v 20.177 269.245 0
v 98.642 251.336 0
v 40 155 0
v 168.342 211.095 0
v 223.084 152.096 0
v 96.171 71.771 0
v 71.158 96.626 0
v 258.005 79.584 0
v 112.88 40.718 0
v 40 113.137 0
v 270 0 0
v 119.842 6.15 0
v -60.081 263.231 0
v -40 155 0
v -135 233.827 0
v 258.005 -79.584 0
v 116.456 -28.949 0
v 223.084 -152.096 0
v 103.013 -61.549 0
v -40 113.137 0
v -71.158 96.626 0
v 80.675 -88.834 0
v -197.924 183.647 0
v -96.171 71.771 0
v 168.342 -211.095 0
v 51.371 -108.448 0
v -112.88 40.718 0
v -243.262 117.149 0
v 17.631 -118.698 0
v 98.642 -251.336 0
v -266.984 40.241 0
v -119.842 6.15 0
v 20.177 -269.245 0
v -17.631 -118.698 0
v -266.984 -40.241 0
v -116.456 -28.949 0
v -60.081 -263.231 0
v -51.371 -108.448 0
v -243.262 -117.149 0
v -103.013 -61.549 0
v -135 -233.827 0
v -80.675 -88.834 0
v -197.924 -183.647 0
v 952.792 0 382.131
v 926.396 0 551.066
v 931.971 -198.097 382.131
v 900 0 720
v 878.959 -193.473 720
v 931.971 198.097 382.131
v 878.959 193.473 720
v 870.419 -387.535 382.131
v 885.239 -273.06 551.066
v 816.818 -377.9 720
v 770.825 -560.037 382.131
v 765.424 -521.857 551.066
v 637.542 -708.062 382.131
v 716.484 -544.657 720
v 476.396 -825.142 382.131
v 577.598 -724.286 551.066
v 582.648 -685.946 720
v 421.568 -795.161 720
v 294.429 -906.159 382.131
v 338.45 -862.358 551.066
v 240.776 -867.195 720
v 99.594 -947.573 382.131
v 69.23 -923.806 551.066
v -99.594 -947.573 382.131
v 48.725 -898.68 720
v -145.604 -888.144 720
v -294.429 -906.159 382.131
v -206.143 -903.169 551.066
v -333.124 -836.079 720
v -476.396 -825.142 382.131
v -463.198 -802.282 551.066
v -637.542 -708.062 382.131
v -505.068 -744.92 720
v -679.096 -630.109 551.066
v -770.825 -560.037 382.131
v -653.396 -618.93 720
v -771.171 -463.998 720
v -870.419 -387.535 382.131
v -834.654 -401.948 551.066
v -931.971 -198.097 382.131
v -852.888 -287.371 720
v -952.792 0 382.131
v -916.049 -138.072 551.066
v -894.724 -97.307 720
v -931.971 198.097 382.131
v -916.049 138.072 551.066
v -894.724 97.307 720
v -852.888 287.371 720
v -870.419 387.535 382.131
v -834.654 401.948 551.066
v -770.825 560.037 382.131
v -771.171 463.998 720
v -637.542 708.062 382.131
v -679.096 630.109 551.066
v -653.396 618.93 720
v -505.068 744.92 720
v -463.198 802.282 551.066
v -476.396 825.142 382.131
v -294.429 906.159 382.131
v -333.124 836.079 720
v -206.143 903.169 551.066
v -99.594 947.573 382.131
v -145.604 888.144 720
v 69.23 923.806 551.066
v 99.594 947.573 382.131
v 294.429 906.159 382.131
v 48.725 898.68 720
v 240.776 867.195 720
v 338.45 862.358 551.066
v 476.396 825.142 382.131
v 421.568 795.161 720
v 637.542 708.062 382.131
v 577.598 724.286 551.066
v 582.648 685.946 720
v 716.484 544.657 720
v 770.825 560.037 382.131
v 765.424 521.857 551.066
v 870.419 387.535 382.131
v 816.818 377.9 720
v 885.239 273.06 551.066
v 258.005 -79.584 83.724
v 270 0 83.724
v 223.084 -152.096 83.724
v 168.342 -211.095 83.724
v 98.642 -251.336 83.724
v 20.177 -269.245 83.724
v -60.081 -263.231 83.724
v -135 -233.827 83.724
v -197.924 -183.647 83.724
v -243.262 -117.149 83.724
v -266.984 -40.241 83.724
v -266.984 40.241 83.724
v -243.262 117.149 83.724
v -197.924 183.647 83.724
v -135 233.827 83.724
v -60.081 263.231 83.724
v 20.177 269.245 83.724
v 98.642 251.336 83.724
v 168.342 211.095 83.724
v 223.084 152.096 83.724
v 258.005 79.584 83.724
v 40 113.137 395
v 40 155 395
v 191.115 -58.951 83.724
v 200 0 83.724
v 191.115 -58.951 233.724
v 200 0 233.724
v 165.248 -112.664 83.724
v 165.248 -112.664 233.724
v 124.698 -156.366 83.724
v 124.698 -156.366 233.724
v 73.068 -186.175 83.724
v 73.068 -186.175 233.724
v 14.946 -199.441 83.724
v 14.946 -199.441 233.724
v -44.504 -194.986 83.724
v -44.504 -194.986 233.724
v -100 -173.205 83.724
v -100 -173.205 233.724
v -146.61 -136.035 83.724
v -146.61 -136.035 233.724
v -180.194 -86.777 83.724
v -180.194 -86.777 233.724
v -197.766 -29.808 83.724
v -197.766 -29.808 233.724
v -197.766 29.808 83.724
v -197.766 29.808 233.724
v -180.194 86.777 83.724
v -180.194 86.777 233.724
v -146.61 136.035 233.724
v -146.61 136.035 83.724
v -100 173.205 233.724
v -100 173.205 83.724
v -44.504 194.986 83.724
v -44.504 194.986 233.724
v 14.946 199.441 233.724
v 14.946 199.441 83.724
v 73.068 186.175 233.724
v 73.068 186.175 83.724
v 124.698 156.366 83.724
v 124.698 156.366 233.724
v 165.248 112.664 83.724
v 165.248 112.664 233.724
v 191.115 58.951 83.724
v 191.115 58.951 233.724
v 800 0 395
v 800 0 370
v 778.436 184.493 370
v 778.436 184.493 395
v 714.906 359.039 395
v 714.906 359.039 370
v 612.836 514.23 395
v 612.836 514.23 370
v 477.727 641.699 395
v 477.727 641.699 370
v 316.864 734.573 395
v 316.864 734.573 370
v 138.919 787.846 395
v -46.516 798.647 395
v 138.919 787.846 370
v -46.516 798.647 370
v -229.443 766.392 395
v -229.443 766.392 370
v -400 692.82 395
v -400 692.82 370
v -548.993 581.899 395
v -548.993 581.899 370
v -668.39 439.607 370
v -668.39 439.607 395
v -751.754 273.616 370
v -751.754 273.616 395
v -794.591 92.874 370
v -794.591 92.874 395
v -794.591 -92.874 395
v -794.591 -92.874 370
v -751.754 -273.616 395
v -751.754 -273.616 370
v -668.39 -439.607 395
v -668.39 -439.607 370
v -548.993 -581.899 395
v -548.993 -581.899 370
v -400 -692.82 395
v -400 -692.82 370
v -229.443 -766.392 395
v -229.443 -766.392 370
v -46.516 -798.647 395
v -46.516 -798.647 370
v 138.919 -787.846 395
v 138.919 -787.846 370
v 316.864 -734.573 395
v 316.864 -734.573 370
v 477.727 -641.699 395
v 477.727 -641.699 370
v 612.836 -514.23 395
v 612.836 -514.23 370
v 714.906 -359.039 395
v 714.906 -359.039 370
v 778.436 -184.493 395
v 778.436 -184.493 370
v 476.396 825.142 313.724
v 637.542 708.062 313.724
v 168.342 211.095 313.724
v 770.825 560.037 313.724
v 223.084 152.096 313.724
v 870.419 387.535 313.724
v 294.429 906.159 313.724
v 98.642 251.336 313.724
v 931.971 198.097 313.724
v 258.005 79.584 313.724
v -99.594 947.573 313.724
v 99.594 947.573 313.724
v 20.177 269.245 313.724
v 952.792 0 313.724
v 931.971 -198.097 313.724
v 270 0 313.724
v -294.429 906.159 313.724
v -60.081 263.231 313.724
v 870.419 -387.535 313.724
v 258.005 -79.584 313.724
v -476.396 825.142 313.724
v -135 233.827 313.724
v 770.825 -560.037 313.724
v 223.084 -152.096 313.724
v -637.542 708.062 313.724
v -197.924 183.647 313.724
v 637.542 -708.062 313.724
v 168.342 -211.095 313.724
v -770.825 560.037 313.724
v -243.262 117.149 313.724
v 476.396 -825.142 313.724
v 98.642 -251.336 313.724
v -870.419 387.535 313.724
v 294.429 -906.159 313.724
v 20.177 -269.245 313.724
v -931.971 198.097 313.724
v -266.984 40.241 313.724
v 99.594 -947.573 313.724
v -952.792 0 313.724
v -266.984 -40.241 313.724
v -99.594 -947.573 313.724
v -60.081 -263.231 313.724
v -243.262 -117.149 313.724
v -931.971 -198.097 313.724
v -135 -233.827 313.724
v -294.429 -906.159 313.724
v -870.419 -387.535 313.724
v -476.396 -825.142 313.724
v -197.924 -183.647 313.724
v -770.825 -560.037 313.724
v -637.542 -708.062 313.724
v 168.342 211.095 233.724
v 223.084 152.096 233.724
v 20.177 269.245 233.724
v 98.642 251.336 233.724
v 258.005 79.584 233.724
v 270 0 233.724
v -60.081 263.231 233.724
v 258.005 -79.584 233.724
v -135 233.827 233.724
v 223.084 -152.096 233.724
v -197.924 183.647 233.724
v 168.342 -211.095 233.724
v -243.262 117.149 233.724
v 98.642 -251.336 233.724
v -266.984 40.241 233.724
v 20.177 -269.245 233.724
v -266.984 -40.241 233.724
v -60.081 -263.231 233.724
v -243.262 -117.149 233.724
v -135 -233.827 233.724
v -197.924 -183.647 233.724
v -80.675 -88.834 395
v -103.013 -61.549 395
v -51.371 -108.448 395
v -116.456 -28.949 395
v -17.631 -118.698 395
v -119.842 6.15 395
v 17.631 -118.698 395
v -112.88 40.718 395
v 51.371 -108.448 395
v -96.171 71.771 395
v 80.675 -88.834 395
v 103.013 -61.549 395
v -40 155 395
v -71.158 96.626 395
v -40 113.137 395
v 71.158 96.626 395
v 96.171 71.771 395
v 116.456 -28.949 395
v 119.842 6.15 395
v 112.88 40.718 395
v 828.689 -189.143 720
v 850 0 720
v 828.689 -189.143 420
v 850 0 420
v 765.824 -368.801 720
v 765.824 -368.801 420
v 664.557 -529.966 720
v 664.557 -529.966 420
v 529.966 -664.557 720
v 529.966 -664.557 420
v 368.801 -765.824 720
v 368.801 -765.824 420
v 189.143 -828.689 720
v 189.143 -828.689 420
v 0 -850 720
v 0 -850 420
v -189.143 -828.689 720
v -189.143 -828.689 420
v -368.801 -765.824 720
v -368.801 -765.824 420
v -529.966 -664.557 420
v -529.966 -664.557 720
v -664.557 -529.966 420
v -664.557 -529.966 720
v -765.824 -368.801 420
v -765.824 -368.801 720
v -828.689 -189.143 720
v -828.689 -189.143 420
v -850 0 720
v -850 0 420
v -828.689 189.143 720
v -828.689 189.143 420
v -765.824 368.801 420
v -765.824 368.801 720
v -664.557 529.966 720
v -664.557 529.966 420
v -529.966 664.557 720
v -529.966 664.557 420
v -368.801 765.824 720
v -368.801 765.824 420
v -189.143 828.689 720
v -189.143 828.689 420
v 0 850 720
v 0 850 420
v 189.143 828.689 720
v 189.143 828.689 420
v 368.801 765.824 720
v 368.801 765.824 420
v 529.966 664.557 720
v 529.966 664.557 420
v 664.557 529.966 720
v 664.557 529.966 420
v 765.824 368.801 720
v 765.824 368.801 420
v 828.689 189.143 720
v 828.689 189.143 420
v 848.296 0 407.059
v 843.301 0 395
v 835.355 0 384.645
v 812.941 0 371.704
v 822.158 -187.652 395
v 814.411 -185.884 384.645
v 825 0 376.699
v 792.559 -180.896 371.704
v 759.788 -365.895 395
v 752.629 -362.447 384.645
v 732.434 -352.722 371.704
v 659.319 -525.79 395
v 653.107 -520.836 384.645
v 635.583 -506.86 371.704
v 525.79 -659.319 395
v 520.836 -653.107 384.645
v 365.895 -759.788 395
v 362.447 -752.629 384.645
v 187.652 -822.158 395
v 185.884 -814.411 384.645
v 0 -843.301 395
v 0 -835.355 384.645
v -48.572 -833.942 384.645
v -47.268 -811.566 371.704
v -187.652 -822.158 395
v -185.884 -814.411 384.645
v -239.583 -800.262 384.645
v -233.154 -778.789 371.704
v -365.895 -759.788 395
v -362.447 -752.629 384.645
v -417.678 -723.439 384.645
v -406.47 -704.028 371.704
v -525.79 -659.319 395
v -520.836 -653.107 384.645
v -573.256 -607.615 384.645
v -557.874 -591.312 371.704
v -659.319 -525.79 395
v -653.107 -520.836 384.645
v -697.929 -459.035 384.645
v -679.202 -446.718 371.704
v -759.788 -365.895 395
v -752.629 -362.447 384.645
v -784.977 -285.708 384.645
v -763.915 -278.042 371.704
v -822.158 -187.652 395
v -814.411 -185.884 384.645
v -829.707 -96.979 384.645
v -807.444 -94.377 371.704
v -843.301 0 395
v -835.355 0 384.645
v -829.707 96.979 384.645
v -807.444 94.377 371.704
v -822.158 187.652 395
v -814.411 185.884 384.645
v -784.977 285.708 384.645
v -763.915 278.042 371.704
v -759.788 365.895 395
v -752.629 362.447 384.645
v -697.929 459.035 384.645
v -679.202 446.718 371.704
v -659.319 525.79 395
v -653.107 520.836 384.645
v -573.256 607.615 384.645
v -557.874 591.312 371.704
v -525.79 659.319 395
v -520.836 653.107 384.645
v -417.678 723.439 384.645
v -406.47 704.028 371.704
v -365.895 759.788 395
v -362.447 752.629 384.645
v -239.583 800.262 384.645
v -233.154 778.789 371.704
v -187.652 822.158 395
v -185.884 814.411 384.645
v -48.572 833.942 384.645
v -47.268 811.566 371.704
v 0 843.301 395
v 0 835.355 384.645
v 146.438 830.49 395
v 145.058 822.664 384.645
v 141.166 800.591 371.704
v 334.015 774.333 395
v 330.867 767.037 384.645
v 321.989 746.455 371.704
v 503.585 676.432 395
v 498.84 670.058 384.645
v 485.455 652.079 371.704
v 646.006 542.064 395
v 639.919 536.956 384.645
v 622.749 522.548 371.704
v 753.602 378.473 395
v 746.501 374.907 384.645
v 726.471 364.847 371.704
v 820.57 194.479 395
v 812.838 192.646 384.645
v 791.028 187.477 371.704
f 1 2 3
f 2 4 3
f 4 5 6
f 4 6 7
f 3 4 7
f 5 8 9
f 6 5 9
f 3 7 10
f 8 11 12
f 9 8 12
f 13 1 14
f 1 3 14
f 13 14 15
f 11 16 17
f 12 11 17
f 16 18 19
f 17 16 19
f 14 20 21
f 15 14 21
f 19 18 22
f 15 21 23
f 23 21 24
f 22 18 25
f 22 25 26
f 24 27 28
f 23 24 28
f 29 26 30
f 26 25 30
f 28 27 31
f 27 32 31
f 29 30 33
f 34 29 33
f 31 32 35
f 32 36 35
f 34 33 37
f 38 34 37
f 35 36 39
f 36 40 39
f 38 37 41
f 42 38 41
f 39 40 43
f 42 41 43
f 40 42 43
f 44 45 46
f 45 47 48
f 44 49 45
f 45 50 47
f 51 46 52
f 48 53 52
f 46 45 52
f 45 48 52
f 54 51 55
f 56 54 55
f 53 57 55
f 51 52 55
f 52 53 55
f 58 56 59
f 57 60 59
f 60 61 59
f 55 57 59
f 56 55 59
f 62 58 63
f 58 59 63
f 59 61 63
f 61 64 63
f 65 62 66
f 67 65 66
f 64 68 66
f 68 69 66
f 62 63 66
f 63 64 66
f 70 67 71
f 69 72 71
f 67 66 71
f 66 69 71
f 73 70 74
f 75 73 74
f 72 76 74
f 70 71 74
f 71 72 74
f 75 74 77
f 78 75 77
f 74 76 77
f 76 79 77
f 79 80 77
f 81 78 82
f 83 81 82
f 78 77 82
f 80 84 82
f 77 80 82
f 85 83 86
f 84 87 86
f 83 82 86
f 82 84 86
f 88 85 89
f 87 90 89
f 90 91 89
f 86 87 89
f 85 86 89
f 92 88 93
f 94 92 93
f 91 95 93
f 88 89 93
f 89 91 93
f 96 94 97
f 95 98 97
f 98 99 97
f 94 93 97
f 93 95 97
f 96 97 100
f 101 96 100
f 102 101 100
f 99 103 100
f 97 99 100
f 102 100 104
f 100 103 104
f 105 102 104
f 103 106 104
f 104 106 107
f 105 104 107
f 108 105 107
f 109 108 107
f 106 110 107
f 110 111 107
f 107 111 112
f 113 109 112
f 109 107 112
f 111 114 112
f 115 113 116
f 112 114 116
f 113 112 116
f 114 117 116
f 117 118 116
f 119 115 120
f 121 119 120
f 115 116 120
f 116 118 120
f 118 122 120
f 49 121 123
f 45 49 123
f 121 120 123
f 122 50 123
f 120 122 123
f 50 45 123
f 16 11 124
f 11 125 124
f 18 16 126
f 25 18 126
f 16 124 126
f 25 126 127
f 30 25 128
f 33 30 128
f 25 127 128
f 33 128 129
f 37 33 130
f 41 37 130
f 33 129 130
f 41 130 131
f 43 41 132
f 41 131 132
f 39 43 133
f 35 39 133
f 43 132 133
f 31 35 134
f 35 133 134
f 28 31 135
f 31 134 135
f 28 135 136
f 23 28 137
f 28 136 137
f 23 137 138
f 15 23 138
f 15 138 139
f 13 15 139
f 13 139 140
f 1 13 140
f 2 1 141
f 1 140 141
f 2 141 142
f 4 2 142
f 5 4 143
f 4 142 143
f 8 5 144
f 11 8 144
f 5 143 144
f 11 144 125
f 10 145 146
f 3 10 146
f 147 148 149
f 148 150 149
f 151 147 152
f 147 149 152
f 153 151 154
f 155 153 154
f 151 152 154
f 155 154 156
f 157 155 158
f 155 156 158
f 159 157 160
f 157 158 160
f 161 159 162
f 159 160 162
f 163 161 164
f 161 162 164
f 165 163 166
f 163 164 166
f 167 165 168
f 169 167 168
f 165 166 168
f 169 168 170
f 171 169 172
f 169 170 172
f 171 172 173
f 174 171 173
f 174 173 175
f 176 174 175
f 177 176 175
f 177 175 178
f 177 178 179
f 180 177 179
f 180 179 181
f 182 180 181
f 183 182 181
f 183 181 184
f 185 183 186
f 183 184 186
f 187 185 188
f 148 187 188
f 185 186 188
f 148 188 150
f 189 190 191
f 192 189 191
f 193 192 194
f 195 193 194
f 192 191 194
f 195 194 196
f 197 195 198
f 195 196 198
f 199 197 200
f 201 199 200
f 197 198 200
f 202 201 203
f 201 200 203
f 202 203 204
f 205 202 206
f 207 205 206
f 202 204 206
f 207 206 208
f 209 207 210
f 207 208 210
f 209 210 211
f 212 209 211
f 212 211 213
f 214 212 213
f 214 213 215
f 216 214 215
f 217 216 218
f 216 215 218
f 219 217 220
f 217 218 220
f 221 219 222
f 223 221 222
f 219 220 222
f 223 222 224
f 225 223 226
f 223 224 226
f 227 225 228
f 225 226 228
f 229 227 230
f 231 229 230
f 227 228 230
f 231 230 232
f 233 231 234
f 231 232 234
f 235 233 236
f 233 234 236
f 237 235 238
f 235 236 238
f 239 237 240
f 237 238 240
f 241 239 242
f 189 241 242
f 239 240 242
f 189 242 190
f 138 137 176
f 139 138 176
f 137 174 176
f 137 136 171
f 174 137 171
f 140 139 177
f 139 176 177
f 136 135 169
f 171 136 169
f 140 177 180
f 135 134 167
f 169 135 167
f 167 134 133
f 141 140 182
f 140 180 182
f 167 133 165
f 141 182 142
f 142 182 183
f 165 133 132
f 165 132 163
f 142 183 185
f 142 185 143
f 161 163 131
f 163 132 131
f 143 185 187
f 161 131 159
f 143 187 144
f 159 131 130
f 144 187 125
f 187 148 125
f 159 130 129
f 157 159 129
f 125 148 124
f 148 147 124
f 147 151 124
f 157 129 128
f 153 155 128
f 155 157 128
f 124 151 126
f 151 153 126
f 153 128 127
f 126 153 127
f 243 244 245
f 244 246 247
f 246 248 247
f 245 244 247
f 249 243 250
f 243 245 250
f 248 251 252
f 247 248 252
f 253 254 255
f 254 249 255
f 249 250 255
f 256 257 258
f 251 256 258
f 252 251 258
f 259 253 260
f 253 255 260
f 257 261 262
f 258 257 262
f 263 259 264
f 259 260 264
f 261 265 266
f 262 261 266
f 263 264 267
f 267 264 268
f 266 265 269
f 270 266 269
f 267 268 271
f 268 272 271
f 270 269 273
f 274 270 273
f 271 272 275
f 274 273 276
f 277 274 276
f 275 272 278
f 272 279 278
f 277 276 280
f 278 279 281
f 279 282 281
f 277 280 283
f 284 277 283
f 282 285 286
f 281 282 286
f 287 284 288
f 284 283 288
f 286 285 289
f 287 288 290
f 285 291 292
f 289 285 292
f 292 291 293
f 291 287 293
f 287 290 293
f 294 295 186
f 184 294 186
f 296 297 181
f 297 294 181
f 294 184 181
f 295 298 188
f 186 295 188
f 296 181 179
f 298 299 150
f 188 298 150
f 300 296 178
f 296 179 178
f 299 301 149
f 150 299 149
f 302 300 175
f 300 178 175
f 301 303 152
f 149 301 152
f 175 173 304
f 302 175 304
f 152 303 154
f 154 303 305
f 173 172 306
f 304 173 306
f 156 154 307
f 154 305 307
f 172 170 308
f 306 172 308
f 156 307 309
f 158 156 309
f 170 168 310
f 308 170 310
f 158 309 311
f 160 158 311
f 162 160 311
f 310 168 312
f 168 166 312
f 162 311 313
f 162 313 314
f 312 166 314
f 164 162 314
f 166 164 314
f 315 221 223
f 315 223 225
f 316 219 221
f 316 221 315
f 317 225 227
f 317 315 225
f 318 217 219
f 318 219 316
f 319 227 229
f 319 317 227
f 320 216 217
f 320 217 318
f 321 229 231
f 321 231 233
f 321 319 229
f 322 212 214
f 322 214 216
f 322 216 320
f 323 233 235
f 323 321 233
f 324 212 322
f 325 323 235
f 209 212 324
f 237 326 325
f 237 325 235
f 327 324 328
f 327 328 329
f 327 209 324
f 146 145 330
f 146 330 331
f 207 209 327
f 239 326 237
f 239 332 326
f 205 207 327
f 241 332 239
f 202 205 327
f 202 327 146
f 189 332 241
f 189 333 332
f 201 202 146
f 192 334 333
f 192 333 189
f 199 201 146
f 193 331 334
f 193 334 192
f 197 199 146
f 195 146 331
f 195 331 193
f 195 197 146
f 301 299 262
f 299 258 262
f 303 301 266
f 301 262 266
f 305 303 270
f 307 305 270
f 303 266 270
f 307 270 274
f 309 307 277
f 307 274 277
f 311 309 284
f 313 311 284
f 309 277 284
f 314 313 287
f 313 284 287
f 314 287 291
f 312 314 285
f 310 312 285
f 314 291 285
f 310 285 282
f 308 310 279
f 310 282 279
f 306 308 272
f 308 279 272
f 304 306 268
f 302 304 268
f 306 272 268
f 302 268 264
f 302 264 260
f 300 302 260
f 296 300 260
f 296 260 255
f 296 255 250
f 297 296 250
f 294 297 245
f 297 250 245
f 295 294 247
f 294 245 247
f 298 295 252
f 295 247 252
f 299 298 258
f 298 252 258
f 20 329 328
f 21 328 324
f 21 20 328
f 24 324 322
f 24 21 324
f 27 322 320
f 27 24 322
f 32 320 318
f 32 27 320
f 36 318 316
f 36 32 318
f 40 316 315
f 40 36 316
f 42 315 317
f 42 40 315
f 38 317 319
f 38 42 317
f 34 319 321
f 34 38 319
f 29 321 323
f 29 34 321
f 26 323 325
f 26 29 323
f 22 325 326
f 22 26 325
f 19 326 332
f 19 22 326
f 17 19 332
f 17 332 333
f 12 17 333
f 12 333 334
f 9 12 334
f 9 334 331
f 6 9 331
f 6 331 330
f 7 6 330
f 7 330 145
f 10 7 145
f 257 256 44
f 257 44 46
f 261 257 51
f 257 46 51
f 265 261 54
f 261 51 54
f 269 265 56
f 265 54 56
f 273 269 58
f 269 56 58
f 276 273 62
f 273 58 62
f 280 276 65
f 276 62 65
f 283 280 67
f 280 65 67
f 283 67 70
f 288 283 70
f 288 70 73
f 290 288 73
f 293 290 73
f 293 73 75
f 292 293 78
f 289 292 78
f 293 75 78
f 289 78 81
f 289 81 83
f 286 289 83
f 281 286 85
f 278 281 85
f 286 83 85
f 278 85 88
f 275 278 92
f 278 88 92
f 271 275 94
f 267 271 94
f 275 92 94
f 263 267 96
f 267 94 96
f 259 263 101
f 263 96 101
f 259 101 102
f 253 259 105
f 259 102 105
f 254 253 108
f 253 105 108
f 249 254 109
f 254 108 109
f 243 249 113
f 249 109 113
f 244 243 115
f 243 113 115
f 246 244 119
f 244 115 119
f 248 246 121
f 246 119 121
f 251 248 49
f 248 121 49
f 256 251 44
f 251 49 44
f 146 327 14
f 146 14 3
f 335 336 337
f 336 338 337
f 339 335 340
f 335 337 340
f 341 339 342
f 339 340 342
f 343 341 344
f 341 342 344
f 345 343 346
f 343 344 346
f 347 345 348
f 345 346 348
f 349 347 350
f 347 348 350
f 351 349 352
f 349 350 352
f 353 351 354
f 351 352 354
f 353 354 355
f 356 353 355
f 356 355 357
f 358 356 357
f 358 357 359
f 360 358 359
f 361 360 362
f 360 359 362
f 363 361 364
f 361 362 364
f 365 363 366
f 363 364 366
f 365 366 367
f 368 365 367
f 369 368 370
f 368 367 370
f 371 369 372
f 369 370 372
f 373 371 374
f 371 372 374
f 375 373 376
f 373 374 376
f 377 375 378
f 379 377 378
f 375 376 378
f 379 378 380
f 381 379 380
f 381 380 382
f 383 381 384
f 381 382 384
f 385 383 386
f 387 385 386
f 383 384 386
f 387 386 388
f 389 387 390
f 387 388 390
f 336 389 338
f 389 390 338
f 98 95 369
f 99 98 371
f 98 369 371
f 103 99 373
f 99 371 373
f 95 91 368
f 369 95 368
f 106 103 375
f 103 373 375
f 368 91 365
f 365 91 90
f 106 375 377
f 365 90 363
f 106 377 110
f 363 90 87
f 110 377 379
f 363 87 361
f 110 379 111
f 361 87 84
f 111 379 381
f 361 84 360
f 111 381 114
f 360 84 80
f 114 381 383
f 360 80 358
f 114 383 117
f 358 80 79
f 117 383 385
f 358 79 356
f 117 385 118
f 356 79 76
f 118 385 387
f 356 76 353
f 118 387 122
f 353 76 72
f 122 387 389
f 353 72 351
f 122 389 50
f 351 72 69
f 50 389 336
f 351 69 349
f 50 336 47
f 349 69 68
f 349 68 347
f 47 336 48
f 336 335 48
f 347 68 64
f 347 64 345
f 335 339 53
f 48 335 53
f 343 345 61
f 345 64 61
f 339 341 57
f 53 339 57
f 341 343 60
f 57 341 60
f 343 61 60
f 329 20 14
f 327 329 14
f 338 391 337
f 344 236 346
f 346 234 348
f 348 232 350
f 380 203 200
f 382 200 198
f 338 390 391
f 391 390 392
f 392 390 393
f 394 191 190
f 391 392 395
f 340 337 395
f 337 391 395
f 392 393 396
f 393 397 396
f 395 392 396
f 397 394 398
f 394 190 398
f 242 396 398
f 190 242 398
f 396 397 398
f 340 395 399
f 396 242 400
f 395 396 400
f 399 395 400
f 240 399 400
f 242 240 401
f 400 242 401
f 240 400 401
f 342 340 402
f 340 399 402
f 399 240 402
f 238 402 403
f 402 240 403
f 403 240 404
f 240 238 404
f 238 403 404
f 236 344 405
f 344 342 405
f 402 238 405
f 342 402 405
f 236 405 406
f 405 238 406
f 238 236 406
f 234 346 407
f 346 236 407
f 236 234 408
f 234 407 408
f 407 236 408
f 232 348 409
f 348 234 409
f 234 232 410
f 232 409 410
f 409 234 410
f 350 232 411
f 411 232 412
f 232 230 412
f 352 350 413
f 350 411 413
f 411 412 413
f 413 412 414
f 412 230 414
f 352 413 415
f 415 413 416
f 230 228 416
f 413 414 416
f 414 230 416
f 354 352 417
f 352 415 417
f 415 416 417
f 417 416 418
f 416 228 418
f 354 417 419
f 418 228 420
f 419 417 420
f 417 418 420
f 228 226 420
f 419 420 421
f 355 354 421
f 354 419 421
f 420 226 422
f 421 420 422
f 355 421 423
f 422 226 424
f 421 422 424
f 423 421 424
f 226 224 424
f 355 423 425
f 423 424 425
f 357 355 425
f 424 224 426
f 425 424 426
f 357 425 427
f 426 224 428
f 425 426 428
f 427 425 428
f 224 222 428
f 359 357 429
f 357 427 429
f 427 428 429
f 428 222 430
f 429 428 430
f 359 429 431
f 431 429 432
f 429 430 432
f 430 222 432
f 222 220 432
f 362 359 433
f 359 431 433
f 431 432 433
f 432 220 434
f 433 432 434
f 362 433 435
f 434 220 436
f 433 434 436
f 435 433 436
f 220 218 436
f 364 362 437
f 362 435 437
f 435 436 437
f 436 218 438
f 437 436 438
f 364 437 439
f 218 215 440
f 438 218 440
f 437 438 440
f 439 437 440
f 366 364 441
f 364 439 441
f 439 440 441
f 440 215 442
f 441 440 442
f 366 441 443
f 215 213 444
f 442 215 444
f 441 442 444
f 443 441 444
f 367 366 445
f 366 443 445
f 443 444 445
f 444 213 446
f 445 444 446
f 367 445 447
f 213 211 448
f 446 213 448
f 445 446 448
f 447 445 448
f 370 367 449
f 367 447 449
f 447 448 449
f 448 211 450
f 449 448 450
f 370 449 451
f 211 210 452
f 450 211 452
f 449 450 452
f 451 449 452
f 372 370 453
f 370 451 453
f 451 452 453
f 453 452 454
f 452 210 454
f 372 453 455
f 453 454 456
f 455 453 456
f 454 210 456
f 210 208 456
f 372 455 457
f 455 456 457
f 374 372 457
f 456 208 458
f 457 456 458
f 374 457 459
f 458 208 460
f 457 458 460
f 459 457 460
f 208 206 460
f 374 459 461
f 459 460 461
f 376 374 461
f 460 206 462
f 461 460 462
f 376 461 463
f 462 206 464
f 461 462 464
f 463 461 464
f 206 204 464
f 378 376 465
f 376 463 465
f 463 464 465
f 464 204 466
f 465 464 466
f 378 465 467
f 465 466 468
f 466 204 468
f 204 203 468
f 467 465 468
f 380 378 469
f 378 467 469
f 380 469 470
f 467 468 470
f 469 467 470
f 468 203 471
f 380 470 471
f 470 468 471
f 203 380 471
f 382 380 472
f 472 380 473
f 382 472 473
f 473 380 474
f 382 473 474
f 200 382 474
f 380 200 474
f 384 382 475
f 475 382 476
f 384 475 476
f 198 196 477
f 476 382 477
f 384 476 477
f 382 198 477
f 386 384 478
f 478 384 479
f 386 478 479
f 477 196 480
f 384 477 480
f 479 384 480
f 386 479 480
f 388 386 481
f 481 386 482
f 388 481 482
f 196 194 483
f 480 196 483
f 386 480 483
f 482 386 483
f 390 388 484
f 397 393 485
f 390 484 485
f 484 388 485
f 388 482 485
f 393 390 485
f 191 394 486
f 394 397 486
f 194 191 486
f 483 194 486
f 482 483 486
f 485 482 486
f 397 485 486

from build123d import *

# Parameters (mm, degrees)
F2_R     = 800
F2_R_2   = 120
F3_DEPTH = 25
F4_W     = 80
F4_H     = 70
F5_DEPTH = 395.001


with BuildPart() as f1:
    # F0 (on Front) → F1 (revolve)
    with BuildSketch(Plane.XZ):
        with BuildLine():
            Line((120, 370), (120, 0))
            Line((120, 0), (270, 0))
            Line((270, 0), (270, 83.724369))
            Line((270, 83.724369), (200, 83.724369))
            Line((200, 83.724369), (200, 233.724369))
            Line((200, 233.724369), (270, 233.724369))
            Line((270, 233.724369), (270, 313.724369))
            Line((270, 313.724369), (952.792001, 313.724369))
            Line((952.792001, 313.724369), (952.792001, 382.131195))
            Line((952.792001, 382.131195), (900, 720))
            Line((900, 720), (850, 720))
            Line((850, 720), (850, 420))
            ThreePointArc((850, 420), (835.355339, 384.644661), (800, 370))
            Line((800, 370), (120, 370))
        make_face()
    revolve(axis=Axis((0, 0, -17.114428), (0, 0, -1)))

    # F2 (on face) → F3 (join)
    with BuildSketch(Plane.XY.offset(370)):
        Circle(F2_R)
        Circle(F2_R_2, mode=Mode.SUBTRACT)
    extrude(amount=F3_DEPTH)

    # F4 (on face) → F5 (cut, through all)
    with BuildSketch(Plane.XY.offset(395)):
        with Locations((0, 120)):
            Rectangle(F4_W, F4_H)
    extrude(amount=-F5_DEPTH, mode=Mode.SUBTRACT)


solid = f1.part
